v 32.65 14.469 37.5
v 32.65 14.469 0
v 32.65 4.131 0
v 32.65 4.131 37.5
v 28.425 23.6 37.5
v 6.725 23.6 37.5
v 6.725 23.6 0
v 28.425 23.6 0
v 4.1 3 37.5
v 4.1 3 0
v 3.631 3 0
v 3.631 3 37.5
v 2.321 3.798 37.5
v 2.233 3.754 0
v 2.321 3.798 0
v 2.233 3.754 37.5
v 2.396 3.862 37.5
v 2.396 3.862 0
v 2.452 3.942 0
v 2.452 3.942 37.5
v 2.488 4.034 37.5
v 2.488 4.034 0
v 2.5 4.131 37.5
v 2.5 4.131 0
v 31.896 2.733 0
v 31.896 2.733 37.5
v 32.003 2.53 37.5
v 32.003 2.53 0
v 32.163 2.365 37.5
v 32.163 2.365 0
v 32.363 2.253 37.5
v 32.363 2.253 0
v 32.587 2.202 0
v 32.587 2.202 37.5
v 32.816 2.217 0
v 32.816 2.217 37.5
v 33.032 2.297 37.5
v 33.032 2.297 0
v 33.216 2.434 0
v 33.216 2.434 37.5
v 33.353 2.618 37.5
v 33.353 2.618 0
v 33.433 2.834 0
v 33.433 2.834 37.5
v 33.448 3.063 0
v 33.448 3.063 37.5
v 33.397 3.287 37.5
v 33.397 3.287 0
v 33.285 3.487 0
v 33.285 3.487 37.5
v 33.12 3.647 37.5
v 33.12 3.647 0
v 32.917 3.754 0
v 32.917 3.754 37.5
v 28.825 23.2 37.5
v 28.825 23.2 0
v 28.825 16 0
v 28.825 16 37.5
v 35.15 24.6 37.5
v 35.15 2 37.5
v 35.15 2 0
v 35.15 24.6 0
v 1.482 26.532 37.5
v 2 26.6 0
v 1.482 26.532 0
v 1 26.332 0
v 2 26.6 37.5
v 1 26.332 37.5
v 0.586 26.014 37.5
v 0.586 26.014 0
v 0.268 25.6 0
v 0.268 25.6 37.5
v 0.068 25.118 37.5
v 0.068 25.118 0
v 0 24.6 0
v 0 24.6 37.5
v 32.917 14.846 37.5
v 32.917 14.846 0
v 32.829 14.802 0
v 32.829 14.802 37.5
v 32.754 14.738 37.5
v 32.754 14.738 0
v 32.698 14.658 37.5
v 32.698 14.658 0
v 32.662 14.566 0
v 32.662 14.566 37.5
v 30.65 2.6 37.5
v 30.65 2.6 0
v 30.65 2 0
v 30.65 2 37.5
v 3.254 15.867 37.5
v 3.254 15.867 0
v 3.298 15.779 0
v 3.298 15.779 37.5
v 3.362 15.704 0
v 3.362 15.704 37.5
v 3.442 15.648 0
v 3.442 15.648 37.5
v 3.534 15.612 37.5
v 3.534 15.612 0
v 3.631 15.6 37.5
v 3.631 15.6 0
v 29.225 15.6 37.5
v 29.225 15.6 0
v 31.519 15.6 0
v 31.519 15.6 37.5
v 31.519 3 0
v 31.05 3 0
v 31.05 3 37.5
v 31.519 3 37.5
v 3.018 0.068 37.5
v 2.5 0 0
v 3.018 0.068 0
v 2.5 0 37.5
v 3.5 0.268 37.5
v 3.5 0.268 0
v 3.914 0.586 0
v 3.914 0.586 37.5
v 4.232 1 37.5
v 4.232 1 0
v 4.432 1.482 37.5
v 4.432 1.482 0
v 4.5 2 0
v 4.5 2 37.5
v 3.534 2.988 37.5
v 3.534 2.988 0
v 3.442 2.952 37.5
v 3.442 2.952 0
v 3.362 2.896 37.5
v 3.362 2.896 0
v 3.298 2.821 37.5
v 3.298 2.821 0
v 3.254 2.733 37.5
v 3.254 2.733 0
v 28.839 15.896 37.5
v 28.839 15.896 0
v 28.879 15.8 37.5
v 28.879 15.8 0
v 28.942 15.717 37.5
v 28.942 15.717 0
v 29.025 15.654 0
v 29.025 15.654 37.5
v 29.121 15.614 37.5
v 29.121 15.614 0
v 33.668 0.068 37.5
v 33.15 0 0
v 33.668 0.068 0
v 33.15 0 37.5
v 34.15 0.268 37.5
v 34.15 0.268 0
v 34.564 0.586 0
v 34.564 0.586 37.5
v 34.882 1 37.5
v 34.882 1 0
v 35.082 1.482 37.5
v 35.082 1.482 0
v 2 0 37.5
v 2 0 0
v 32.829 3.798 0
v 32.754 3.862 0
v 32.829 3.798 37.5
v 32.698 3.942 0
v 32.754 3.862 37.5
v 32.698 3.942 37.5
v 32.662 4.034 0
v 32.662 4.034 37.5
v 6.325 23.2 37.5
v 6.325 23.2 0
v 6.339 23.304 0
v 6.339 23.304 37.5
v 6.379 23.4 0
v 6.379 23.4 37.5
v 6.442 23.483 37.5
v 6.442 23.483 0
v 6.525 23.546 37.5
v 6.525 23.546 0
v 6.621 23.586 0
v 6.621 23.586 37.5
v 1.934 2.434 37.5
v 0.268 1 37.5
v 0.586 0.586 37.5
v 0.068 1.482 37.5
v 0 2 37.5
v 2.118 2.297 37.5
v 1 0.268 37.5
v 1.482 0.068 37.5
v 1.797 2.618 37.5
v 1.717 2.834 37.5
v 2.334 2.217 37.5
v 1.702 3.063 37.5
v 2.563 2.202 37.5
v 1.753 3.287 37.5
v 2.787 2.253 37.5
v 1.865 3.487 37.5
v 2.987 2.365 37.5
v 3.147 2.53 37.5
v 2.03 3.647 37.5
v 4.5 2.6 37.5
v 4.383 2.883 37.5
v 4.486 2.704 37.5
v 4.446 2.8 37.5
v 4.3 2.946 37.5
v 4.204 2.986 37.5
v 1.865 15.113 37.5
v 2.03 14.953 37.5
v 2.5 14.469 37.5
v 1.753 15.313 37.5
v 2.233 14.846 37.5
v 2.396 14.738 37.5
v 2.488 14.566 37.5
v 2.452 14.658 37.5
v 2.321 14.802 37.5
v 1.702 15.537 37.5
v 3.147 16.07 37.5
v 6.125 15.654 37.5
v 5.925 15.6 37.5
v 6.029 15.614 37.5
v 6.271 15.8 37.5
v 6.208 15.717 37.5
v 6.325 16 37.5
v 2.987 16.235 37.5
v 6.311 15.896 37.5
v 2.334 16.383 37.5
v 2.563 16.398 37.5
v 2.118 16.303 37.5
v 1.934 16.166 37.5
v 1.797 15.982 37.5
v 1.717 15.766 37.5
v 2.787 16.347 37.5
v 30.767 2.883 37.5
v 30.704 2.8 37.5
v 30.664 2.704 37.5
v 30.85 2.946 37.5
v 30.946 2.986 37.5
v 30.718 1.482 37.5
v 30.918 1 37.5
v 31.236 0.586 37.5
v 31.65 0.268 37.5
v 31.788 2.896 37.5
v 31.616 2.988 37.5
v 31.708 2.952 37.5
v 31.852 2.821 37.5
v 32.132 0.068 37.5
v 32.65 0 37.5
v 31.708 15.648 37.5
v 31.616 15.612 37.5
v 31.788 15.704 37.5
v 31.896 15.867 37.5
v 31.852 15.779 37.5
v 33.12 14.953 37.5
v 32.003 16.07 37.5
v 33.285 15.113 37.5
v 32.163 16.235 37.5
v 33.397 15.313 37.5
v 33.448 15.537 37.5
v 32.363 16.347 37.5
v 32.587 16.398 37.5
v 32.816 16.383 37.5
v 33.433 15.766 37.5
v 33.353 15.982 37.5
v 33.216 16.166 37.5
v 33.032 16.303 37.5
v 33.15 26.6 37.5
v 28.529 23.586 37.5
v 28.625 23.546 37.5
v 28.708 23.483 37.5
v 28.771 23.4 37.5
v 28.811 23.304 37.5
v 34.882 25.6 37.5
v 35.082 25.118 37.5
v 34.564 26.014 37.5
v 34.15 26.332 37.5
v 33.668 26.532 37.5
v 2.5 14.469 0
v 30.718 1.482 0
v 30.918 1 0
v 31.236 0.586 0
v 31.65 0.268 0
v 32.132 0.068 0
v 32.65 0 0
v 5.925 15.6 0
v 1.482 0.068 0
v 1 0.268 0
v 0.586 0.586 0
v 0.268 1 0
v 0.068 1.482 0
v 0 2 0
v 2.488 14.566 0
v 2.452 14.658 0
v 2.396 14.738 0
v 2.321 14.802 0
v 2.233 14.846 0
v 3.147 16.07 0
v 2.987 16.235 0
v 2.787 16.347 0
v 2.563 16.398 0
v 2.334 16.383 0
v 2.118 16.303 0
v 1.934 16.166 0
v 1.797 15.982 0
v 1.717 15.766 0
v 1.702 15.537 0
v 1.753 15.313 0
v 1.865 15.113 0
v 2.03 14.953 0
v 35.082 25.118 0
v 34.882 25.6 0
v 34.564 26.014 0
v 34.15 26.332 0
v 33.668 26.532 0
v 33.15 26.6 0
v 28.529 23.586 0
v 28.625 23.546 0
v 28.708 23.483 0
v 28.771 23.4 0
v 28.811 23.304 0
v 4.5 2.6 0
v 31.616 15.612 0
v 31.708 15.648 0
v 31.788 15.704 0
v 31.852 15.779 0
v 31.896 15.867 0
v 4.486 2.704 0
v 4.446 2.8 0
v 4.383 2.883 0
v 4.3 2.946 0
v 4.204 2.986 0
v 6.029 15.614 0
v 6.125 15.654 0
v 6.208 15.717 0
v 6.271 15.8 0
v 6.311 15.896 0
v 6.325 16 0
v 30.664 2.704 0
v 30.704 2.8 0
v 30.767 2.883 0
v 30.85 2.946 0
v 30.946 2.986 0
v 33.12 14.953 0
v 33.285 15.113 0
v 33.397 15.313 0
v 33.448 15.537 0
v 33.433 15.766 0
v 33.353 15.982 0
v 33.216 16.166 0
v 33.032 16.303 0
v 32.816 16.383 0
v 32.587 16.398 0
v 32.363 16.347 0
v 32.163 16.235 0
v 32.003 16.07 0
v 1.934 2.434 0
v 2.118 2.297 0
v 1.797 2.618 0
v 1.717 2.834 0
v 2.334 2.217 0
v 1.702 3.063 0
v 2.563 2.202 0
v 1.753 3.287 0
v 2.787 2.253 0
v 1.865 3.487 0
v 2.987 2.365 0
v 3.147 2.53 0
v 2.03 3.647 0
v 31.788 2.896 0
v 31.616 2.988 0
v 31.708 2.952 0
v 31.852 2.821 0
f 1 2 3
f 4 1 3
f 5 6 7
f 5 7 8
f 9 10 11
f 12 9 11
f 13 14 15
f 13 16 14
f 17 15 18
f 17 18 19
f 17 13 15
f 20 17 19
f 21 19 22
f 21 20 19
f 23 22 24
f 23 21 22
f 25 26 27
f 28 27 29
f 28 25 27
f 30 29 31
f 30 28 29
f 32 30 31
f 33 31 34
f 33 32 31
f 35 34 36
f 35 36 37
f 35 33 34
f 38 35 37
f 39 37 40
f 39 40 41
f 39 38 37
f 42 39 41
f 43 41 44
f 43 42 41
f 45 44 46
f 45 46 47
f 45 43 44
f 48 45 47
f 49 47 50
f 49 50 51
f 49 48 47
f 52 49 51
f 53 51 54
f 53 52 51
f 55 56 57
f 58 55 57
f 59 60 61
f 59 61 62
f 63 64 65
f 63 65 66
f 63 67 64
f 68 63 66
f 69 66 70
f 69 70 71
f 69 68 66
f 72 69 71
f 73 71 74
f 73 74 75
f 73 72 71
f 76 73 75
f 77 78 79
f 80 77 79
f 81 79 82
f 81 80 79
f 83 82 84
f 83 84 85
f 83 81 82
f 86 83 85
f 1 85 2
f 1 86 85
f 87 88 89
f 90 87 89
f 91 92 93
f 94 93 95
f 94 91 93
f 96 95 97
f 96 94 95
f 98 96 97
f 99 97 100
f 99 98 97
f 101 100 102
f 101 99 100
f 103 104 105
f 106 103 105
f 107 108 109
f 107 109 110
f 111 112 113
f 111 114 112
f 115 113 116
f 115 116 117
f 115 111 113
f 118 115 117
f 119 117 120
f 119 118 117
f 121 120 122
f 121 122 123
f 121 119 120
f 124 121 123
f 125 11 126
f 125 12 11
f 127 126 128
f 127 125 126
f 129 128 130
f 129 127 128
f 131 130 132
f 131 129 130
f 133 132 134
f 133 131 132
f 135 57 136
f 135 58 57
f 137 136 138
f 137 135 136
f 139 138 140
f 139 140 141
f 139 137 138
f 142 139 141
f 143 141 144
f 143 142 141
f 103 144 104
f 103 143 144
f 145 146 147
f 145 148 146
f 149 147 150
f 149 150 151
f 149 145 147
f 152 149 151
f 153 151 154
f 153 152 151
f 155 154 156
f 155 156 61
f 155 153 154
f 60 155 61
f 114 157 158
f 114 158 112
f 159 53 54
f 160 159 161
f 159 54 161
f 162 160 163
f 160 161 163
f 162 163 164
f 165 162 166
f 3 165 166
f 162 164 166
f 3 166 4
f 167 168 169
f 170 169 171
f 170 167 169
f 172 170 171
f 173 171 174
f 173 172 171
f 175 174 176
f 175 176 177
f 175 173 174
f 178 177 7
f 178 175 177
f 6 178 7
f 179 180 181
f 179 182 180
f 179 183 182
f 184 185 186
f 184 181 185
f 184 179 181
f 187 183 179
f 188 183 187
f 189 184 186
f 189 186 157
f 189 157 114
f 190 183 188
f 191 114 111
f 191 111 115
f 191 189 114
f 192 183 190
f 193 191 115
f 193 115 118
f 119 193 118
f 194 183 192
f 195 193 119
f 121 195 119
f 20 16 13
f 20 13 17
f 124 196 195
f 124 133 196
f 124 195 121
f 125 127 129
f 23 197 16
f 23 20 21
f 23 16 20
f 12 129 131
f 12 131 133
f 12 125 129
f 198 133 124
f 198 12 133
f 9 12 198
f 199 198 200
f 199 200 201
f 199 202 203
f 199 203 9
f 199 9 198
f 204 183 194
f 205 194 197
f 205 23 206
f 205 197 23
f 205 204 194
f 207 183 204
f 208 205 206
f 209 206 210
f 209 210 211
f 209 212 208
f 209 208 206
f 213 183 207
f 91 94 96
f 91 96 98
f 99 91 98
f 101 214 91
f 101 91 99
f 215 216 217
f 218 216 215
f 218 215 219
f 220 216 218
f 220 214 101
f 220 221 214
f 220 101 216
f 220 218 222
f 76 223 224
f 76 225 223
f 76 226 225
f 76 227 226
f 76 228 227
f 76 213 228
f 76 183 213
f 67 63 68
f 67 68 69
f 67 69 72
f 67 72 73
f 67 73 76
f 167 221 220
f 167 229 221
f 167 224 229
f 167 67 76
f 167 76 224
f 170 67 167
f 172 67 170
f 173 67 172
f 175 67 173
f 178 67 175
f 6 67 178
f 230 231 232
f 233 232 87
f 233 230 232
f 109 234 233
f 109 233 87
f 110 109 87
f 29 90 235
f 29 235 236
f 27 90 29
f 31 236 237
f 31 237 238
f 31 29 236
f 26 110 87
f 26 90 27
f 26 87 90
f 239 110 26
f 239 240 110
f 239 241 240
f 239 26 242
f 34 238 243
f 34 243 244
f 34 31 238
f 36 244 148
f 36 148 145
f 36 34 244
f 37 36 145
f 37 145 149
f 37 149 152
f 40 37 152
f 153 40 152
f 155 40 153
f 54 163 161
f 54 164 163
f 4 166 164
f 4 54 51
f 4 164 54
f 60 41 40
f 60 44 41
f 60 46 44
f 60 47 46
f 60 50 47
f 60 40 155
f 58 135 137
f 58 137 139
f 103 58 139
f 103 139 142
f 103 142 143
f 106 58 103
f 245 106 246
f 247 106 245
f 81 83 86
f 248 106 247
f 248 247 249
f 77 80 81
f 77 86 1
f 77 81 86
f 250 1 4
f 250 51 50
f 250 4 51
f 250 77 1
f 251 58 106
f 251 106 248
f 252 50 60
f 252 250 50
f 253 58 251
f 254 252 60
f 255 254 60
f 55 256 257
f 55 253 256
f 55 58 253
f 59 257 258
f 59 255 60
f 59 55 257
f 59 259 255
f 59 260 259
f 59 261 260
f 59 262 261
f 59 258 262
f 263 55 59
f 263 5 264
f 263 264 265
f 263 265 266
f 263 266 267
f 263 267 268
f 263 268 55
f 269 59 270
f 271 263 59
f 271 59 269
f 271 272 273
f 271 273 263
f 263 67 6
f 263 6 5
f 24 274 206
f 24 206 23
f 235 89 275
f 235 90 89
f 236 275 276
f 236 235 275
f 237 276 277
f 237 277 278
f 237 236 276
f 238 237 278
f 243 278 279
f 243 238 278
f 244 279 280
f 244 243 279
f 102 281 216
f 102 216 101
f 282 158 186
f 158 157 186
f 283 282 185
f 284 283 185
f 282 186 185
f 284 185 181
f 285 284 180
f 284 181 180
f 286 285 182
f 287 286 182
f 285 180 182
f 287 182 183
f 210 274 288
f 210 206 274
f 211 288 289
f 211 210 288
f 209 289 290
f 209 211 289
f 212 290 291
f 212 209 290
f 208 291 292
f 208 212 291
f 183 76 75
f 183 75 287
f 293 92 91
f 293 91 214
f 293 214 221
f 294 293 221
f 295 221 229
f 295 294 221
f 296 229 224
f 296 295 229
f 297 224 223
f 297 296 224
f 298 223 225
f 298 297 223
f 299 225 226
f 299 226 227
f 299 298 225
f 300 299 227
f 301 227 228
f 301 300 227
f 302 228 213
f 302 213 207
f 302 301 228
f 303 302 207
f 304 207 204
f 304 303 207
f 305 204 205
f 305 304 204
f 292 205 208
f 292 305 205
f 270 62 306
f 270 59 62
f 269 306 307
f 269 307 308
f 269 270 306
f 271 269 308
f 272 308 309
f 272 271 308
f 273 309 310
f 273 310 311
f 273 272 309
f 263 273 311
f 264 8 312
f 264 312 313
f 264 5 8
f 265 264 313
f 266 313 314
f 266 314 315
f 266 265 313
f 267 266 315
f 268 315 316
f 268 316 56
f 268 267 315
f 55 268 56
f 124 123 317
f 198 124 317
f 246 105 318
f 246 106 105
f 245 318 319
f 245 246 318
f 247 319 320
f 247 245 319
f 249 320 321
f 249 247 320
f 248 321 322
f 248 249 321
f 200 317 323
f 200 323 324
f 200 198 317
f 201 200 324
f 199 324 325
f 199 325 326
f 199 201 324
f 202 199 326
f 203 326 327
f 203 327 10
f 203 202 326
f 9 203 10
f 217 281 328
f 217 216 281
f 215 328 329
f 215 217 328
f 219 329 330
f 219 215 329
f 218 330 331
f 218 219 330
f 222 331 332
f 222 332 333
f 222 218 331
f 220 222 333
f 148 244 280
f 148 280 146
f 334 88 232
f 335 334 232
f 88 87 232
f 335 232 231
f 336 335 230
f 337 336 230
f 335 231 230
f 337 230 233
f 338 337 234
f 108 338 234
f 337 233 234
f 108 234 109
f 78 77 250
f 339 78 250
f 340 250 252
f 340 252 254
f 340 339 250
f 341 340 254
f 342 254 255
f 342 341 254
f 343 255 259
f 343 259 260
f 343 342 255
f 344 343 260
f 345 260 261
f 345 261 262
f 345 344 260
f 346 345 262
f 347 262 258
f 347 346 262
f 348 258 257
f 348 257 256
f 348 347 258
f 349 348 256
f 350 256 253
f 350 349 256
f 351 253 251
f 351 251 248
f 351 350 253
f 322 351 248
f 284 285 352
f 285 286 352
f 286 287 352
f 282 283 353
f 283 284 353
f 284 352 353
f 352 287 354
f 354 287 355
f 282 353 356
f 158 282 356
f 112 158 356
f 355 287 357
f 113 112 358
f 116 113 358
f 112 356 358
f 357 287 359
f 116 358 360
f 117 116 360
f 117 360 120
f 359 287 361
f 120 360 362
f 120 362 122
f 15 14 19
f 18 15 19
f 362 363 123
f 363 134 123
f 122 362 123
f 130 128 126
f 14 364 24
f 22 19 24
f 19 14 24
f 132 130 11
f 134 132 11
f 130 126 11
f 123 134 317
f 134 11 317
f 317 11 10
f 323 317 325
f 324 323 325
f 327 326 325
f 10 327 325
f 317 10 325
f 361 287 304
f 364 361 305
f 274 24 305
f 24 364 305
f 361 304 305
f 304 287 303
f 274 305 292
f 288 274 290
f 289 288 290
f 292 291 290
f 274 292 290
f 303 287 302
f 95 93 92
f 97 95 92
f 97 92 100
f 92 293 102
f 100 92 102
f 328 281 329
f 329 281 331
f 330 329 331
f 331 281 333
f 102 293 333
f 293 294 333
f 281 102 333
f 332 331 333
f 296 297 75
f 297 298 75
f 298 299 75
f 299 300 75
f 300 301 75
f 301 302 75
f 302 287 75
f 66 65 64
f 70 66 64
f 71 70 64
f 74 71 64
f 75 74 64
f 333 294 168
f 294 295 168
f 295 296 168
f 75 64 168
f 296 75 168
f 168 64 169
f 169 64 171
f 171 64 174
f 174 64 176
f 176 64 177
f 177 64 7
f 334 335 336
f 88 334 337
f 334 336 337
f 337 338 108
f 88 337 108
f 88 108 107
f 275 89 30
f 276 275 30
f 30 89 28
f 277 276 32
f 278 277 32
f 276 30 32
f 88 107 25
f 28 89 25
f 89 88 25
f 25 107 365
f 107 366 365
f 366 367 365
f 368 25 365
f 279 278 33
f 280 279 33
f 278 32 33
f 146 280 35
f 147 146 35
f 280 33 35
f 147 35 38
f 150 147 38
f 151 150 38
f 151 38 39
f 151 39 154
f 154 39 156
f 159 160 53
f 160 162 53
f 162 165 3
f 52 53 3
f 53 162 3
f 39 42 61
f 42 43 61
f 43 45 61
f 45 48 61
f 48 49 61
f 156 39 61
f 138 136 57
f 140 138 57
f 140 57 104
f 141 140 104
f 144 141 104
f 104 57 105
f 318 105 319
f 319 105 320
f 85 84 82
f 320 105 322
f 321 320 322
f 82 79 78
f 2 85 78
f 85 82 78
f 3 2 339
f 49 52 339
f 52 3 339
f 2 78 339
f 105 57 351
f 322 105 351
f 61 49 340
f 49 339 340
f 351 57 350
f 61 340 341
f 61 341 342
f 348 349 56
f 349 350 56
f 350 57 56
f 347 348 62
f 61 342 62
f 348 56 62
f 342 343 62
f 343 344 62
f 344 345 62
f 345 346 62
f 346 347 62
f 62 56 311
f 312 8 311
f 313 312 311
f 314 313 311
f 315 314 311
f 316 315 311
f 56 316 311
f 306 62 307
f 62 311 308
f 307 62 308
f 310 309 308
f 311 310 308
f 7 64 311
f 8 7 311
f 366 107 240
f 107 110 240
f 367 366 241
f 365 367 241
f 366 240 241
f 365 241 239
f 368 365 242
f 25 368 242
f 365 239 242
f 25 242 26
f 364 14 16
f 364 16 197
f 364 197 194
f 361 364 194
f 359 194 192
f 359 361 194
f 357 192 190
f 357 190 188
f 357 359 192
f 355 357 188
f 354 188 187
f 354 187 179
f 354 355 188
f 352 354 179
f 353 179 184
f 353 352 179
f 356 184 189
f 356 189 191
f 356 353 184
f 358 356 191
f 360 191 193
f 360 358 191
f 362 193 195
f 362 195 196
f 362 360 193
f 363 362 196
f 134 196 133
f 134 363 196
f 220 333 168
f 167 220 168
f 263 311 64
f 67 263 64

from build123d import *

# Parameters (mm, degrees)
PAD_DEPTH   = 37.5
FILLET_R    = 2
FILLET001_R = 0.4


with BuildPart() as part:
    # Sketch → Pad (new body)
    with BuildSketch(Plane.XY):
        with BuildLine():
            Line((0, 0), (4.5, 0))
            Line((4.5, 0), (4.5, 3))
            Line((4.5, 3), (3.3, 3))
            ThreePointArc((2.5, 3.8), (1.934315, 2.434315), (3.3, 3))
            Line((2.5, 14.8), (2.5, 3.8))
            ThreePointArc((3.3, 15.6), (1.934315, 16.165685), (2.5, 14.8))
            Line((6.325, 15.6), (3.3, 15.6))
            Line((6.325, 15.6), (6.325, 23.6))
            Line((6.325, 23.6), (28.825, 23.6))
            Line((28.825, 23.6), (28.825, 15.6))
            Line((28.825, 15.6), (31.85, 15.6))
            ThreePointArc((32.65, 14.8), (33.215685, 16.165685), (31.85, 15.6))
            Line((32.65, 14.8), (32.65, 3.8))
            ThreePointArc((31.85, 3), (33.215685, 2.434315), (32.65, 3.8))
            Line((30.65, 3), (31.85, 3))
            Line((30.65, 3), (30.65, 0))
            Line((30.65, 0), (35.15, 0))
            Line((35.15, 0), (35.15, 26.6))
            Line((35.15, 26.6), (0, 26.6))
            Line((0, 26.6), (0, 0))
        make_face()
    extrude(amount=PAD_DEPTH)

    # Fillet
    fillet_edges = [part.edges().sort_by_distance(p)[0] for p in [
        (0, 26.6, 18.75),
        (0, 0, 18.75),
        (4.5, 0, 18.75),
        (30.65, 0, 18.75),
        (35.15, 0, 18.75),
        (35.15, 26.6, 18.75),
    ]]
    fillet(fillet_edges, radius=FILLET_R)

    # Fillet001
    fillet001_edges = [part.edges().sort_by_distance(p)[0] for p in [
        (6.325, 15.6, 18.75),
        (6.325, 23.6, 18.75),
        (28.825, 23.6, 18.75),
        (28.825, 15.6, 18.75),
        (4.5, 3, 18.75),
        (30.65, 3, 18.75),
        (3.3, 15.6, 18.75),
        (31.85, 15.6, 18.75),
        (2.5, 14.8, 18.75),
        (32.65, 14.8, 18.75),
        (3.3, 3, 18.75),
        (31.85, 3, 18.75),
        (32.65, 3.8, 18.75),
        (2.5, 3.8, 18.75),
    ]]
    fillet(fillet001_edges, radius=FILLET001_R)


solid = part.part
